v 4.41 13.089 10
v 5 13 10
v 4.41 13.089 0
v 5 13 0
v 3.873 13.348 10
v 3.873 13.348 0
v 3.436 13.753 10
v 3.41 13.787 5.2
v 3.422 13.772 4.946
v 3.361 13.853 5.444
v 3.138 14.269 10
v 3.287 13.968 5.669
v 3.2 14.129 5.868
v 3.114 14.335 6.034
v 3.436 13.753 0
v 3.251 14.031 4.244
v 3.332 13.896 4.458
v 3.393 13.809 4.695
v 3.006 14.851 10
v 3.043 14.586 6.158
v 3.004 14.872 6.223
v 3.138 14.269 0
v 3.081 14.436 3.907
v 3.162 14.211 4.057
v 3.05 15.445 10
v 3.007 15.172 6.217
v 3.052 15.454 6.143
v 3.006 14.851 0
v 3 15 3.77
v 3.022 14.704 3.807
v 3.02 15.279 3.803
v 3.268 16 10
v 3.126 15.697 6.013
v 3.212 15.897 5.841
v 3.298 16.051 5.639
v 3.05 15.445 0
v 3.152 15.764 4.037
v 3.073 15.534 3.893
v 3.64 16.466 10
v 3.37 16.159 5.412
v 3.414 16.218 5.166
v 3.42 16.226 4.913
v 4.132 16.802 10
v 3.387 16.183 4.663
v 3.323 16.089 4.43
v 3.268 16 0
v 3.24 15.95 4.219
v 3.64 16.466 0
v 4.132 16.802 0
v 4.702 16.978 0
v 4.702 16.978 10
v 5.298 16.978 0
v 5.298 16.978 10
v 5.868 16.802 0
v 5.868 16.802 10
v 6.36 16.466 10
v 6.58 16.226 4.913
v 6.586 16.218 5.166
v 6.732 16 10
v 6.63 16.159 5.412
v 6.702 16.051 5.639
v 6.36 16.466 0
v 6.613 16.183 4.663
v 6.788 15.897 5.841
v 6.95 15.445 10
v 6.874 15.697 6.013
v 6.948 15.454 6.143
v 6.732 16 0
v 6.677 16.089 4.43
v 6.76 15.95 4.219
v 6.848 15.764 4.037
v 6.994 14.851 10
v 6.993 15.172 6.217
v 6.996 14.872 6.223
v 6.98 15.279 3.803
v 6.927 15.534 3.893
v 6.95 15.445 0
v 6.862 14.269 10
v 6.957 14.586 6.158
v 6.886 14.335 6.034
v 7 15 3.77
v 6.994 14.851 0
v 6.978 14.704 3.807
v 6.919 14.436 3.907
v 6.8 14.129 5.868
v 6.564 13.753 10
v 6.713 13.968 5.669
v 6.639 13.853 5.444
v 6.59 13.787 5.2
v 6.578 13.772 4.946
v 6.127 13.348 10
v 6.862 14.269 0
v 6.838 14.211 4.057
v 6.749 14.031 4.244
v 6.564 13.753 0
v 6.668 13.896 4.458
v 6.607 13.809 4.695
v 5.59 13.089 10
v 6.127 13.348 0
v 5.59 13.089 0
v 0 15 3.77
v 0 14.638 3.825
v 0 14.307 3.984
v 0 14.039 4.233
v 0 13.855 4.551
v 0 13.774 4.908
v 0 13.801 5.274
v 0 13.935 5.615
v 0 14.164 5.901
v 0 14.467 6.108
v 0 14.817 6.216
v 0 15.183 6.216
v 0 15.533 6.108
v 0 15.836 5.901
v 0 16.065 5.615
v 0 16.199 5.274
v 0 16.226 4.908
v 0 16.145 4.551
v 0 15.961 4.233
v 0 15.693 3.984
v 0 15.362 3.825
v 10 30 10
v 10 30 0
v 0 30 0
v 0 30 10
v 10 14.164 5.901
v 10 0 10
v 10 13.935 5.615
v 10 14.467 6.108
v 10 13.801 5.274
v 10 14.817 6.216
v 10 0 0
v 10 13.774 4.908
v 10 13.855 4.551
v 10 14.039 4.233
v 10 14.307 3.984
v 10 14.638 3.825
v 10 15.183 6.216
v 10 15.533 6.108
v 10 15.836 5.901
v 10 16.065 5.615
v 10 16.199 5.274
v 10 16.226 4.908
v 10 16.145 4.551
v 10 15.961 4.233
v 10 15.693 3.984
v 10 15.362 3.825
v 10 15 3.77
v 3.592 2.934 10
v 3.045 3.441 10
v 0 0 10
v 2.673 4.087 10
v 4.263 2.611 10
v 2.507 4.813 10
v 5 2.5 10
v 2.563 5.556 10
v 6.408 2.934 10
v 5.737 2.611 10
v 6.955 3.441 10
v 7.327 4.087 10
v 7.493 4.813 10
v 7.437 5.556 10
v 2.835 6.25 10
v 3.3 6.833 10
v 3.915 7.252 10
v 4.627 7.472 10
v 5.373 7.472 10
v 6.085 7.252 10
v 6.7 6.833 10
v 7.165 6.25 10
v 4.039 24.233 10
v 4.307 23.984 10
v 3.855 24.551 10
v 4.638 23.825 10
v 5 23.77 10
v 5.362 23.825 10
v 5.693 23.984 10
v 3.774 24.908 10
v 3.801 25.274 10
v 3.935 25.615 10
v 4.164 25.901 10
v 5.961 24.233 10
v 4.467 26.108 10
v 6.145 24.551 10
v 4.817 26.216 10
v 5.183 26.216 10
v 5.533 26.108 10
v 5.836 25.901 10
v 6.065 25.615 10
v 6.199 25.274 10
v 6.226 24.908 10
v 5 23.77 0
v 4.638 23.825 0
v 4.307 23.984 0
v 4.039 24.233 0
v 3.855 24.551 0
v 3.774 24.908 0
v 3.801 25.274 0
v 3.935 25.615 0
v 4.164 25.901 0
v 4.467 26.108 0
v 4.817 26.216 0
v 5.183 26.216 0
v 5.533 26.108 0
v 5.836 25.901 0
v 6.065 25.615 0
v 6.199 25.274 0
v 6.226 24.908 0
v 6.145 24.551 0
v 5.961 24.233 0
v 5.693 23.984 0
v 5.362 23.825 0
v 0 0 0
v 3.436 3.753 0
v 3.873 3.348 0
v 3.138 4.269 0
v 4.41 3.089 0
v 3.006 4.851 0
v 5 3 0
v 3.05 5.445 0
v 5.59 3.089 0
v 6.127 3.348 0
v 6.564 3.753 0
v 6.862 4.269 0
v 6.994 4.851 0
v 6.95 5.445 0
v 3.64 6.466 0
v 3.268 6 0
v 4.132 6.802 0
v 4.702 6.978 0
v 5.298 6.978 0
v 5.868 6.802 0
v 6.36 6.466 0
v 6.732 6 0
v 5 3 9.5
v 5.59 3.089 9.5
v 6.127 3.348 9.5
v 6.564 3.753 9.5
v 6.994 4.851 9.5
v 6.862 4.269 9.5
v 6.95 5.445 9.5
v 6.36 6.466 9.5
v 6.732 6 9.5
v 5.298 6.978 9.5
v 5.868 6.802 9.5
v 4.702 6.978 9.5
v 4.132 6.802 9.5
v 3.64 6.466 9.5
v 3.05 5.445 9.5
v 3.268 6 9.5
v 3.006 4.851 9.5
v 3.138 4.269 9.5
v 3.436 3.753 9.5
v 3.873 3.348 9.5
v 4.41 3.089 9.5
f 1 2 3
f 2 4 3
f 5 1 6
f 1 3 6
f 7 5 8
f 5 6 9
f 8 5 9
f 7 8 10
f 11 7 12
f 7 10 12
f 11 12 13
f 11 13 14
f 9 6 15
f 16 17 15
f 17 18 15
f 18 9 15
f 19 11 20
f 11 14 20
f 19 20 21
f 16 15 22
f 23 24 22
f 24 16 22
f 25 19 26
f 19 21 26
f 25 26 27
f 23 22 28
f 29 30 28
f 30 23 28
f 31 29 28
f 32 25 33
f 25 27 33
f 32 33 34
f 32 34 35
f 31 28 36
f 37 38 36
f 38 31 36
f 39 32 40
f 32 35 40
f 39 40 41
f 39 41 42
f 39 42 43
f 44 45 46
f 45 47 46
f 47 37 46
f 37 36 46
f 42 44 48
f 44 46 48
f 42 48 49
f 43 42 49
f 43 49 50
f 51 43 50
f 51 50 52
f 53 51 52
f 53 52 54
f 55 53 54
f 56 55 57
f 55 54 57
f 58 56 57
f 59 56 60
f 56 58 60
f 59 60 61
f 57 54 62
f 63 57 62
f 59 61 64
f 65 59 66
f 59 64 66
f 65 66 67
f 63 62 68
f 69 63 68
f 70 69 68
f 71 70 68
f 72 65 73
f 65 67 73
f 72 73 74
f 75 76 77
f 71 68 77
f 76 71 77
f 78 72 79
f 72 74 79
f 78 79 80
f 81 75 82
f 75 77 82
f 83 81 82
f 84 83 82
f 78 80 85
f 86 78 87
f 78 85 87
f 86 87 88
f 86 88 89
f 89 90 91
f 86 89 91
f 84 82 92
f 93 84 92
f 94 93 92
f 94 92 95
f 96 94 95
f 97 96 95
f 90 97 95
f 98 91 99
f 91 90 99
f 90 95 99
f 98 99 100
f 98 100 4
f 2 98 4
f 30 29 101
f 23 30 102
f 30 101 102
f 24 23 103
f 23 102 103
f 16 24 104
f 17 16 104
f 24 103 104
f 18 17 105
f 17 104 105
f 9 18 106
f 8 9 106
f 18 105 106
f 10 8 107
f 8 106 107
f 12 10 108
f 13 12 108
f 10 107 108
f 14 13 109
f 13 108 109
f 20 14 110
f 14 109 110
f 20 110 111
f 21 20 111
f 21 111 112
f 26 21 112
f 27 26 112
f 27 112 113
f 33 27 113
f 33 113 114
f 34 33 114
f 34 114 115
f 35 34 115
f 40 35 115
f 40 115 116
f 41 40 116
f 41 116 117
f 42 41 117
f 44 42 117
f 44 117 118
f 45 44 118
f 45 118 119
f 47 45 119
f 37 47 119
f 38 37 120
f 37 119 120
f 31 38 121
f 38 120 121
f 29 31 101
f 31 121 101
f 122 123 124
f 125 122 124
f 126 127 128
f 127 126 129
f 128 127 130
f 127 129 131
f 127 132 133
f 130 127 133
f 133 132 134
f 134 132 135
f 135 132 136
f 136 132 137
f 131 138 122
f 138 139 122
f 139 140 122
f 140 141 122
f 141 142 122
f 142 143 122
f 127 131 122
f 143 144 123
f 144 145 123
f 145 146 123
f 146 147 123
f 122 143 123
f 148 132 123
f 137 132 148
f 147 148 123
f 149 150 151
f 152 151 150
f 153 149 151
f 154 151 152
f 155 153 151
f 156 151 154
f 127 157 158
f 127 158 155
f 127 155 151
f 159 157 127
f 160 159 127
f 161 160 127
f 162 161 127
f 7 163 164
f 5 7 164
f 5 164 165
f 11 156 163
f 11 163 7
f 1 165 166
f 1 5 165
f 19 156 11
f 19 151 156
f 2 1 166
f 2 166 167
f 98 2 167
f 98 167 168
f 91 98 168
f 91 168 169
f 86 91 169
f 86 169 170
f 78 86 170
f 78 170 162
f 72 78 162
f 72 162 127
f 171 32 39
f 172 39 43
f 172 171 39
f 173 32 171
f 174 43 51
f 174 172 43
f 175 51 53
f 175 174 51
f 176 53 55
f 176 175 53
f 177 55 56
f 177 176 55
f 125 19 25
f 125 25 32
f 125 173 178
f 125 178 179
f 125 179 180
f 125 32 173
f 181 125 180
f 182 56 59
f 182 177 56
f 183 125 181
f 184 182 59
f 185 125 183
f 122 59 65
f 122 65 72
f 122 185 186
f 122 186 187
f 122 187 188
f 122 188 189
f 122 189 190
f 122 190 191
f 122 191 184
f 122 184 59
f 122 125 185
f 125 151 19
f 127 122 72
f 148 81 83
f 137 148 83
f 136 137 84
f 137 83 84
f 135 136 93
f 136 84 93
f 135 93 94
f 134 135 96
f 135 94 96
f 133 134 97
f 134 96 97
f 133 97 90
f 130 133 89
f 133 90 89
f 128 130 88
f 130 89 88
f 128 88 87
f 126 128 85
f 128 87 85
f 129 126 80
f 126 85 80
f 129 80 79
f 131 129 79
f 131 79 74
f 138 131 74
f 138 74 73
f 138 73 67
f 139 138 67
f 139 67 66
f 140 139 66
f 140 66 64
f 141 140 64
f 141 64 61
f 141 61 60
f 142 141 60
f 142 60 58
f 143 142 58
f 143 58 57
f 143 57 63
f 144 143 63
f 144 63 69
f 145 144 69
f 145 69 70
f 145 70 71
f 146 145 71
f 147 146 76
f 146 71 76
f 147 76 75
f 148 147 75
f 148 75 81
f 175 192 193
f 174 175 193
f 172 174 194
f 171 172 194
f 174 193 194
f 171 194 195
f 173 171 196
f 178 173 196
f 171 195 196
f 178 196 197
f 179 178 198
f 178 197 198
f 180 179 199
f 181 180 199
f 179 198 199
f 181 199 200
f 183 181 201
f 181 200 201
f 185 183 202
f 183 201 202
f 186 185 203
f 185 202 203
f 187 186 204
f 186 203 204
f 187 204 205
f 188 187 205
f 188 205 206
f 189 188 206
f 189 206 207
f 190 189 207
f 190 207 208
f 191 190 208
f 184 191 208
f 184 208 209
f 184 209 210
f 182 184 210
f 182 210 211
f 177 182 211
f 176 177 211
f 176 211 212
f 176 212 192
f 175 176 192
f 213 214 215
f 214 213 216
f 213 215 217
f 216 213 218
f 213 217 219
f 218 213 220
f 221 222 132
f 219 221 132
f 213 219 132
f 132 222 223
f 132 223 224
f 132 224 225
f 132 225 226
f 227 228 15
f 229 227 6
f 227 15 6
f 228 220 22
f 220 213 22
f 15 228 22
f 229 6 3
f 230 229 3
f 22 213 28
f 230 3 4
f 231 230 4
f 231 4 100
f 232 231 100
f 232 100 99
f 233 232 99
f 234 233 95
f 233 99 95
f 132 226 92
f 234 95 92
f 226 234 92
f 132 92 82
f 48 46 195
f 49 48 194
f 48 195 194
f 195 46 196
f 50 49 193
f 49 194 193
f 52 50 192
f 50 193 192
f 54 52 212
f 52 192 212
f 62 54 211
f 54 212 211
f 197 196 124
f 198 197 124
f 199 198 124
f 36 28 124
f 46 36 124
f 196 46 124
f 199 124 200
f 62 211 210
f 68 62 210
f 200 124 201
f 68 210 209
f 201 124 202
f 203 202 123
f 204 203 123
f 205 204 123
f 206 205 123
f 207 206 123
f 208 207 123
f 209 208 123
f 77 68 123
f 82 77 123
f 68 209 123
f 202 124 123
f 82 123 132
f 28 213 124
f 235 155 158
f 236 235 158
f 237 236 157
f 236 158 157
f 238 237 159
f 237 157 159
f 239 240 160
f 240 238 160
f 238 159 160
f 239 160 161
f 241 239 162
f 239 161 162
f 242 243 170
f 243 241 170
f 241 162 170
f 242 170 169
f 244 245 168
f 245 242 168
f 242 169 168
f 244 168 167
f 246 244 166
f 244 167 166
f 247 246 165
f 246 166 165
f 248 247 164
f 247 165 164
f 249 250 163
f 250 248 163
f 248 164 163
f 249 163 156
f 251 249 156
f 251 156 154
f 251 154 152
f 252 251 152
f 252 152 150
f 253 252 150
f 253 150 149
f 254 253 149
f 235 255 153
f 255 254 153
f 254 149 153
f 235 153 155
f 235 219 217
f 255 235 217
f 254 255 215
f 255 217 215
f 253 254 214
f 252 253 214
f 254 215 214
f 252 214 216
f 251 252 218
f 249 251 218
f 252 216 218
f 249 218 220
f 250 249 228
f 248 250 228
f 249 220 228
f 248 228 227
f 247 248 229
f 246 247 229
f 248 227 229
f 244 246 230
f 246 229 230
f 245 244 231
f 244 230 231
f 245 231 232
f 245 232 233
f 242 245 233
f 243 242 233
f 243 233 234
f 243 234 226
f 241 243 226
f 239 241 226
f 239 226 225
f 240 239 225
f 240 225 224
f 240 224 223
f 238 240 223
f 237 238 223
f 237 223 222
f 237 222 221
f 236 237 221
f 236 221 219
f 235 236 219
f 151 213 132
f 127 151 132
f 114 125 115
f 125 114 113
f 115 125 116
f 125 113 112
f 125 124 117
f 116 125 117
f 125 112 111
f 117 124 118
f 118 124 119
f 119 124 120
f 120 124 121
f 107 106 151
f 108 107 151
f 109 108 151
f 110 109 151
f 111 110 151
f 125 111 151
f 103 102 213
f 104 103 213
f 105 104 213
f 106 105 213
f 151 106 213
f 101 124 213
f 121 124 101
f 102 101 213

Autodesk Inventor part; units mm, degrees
ref_plane "YZ Plane" through (0, 0, 0) normal (1, 0, 0) x (0, 1, 0)
ref_plane "XZ Plane" through (0, 0, 0) normal (0, 1, 0) x (-1, 0, 0)
ref_plane "XY Plane" through (0, 0, 0) normal (0, 0, 1) x (1, 0, 0)
sketch "スケッチ1" plane through (0, 0, 0) normal (0, 0, 1) x (1, 0, 0)
  line L0 (0, 0) -> (10, 0)
  line L1 (10, 0) -> (10, 30)
  line L2 (10, 30) -> (0, 30)
  line L3 (0, 30) -> (0, 0)
  dimension "d0" = 10
  dimension "d1" = 30
extrude "押し出し1" add sketch "スケッチ1" along normal blind 10
sketch "スケッチ2" plane through (0, 0, 10) normal (0, 0, 1) x (1, 0, 0)
  line L0 (10, 30) -> (0, 30) projected
  line L1 (10, 0) -> (10, 30) projected
  point P0 (0, 0)
  point P1 (5, 15)
  dimension "d4" = 15
  dimension "d5" = 5
hole "穴1" at (5, 15, 10) direction (0, 0, -1) diameter 4 end through all
sketch "スケッチ3" plane through (0, 0, 10) normal (0, 0, 1) x (1, 0, 0)
  point P0 (0, 0)
sketch "スケッチ4" plane through (0, 0, 10) normal (0, 0, 1) x (1, 0, 0)
  line L0 (10, 30) -> (0, 30) projected
  line L1 (10, 0) -> (10, 30) projected
  point P0 (0, 0)
  point P1 (5, 25)
  dimension "d13" = 5
  dimension "d14" = 5
hole "穴2" at (5, 25, 10) direction (0, 0, -1) diameter 2.459 end through all thread size "M3x0.5" class "6H" standard "ANSI Metric M Profile"
sketch "スケッチ6" plane through (10, 0, 0) normal (1, 0, 0) x (0, 0, -1)
  line L0 (0, 0) -> (0, 30) projected
  line L1 (0, 30) -> (-10, 30) projected
  point P0 (-5, 15)
  dimension "d31" = 5
  dimension "d32" = 15
hole "穴4" at (10, 15, 5) direction (-1, 0, 0) diameter 2.459 end through all thread size "M3x0.5" class "6H" standard "ANSI Metric M Profile"
sketch "スケッチ8" plane through (0, 0, 10) normal (0, 0, 1) x (1, 0, 0)
  line L0 (10, 0) -> (10, 30) projected
  line L1 (0, 0) -> (10, 0) projected
  point P0 (5, 5)
  dimension "d49" = 5
  dimension "d50" = 5
hole "穴6" at (5, 5, 10) direction (0, 0, -1) diameter 4 depth 10 tip angle 118 countersink diameter 5 countersink angle 90
properties part number "3SR05_振子固定パーツA"
